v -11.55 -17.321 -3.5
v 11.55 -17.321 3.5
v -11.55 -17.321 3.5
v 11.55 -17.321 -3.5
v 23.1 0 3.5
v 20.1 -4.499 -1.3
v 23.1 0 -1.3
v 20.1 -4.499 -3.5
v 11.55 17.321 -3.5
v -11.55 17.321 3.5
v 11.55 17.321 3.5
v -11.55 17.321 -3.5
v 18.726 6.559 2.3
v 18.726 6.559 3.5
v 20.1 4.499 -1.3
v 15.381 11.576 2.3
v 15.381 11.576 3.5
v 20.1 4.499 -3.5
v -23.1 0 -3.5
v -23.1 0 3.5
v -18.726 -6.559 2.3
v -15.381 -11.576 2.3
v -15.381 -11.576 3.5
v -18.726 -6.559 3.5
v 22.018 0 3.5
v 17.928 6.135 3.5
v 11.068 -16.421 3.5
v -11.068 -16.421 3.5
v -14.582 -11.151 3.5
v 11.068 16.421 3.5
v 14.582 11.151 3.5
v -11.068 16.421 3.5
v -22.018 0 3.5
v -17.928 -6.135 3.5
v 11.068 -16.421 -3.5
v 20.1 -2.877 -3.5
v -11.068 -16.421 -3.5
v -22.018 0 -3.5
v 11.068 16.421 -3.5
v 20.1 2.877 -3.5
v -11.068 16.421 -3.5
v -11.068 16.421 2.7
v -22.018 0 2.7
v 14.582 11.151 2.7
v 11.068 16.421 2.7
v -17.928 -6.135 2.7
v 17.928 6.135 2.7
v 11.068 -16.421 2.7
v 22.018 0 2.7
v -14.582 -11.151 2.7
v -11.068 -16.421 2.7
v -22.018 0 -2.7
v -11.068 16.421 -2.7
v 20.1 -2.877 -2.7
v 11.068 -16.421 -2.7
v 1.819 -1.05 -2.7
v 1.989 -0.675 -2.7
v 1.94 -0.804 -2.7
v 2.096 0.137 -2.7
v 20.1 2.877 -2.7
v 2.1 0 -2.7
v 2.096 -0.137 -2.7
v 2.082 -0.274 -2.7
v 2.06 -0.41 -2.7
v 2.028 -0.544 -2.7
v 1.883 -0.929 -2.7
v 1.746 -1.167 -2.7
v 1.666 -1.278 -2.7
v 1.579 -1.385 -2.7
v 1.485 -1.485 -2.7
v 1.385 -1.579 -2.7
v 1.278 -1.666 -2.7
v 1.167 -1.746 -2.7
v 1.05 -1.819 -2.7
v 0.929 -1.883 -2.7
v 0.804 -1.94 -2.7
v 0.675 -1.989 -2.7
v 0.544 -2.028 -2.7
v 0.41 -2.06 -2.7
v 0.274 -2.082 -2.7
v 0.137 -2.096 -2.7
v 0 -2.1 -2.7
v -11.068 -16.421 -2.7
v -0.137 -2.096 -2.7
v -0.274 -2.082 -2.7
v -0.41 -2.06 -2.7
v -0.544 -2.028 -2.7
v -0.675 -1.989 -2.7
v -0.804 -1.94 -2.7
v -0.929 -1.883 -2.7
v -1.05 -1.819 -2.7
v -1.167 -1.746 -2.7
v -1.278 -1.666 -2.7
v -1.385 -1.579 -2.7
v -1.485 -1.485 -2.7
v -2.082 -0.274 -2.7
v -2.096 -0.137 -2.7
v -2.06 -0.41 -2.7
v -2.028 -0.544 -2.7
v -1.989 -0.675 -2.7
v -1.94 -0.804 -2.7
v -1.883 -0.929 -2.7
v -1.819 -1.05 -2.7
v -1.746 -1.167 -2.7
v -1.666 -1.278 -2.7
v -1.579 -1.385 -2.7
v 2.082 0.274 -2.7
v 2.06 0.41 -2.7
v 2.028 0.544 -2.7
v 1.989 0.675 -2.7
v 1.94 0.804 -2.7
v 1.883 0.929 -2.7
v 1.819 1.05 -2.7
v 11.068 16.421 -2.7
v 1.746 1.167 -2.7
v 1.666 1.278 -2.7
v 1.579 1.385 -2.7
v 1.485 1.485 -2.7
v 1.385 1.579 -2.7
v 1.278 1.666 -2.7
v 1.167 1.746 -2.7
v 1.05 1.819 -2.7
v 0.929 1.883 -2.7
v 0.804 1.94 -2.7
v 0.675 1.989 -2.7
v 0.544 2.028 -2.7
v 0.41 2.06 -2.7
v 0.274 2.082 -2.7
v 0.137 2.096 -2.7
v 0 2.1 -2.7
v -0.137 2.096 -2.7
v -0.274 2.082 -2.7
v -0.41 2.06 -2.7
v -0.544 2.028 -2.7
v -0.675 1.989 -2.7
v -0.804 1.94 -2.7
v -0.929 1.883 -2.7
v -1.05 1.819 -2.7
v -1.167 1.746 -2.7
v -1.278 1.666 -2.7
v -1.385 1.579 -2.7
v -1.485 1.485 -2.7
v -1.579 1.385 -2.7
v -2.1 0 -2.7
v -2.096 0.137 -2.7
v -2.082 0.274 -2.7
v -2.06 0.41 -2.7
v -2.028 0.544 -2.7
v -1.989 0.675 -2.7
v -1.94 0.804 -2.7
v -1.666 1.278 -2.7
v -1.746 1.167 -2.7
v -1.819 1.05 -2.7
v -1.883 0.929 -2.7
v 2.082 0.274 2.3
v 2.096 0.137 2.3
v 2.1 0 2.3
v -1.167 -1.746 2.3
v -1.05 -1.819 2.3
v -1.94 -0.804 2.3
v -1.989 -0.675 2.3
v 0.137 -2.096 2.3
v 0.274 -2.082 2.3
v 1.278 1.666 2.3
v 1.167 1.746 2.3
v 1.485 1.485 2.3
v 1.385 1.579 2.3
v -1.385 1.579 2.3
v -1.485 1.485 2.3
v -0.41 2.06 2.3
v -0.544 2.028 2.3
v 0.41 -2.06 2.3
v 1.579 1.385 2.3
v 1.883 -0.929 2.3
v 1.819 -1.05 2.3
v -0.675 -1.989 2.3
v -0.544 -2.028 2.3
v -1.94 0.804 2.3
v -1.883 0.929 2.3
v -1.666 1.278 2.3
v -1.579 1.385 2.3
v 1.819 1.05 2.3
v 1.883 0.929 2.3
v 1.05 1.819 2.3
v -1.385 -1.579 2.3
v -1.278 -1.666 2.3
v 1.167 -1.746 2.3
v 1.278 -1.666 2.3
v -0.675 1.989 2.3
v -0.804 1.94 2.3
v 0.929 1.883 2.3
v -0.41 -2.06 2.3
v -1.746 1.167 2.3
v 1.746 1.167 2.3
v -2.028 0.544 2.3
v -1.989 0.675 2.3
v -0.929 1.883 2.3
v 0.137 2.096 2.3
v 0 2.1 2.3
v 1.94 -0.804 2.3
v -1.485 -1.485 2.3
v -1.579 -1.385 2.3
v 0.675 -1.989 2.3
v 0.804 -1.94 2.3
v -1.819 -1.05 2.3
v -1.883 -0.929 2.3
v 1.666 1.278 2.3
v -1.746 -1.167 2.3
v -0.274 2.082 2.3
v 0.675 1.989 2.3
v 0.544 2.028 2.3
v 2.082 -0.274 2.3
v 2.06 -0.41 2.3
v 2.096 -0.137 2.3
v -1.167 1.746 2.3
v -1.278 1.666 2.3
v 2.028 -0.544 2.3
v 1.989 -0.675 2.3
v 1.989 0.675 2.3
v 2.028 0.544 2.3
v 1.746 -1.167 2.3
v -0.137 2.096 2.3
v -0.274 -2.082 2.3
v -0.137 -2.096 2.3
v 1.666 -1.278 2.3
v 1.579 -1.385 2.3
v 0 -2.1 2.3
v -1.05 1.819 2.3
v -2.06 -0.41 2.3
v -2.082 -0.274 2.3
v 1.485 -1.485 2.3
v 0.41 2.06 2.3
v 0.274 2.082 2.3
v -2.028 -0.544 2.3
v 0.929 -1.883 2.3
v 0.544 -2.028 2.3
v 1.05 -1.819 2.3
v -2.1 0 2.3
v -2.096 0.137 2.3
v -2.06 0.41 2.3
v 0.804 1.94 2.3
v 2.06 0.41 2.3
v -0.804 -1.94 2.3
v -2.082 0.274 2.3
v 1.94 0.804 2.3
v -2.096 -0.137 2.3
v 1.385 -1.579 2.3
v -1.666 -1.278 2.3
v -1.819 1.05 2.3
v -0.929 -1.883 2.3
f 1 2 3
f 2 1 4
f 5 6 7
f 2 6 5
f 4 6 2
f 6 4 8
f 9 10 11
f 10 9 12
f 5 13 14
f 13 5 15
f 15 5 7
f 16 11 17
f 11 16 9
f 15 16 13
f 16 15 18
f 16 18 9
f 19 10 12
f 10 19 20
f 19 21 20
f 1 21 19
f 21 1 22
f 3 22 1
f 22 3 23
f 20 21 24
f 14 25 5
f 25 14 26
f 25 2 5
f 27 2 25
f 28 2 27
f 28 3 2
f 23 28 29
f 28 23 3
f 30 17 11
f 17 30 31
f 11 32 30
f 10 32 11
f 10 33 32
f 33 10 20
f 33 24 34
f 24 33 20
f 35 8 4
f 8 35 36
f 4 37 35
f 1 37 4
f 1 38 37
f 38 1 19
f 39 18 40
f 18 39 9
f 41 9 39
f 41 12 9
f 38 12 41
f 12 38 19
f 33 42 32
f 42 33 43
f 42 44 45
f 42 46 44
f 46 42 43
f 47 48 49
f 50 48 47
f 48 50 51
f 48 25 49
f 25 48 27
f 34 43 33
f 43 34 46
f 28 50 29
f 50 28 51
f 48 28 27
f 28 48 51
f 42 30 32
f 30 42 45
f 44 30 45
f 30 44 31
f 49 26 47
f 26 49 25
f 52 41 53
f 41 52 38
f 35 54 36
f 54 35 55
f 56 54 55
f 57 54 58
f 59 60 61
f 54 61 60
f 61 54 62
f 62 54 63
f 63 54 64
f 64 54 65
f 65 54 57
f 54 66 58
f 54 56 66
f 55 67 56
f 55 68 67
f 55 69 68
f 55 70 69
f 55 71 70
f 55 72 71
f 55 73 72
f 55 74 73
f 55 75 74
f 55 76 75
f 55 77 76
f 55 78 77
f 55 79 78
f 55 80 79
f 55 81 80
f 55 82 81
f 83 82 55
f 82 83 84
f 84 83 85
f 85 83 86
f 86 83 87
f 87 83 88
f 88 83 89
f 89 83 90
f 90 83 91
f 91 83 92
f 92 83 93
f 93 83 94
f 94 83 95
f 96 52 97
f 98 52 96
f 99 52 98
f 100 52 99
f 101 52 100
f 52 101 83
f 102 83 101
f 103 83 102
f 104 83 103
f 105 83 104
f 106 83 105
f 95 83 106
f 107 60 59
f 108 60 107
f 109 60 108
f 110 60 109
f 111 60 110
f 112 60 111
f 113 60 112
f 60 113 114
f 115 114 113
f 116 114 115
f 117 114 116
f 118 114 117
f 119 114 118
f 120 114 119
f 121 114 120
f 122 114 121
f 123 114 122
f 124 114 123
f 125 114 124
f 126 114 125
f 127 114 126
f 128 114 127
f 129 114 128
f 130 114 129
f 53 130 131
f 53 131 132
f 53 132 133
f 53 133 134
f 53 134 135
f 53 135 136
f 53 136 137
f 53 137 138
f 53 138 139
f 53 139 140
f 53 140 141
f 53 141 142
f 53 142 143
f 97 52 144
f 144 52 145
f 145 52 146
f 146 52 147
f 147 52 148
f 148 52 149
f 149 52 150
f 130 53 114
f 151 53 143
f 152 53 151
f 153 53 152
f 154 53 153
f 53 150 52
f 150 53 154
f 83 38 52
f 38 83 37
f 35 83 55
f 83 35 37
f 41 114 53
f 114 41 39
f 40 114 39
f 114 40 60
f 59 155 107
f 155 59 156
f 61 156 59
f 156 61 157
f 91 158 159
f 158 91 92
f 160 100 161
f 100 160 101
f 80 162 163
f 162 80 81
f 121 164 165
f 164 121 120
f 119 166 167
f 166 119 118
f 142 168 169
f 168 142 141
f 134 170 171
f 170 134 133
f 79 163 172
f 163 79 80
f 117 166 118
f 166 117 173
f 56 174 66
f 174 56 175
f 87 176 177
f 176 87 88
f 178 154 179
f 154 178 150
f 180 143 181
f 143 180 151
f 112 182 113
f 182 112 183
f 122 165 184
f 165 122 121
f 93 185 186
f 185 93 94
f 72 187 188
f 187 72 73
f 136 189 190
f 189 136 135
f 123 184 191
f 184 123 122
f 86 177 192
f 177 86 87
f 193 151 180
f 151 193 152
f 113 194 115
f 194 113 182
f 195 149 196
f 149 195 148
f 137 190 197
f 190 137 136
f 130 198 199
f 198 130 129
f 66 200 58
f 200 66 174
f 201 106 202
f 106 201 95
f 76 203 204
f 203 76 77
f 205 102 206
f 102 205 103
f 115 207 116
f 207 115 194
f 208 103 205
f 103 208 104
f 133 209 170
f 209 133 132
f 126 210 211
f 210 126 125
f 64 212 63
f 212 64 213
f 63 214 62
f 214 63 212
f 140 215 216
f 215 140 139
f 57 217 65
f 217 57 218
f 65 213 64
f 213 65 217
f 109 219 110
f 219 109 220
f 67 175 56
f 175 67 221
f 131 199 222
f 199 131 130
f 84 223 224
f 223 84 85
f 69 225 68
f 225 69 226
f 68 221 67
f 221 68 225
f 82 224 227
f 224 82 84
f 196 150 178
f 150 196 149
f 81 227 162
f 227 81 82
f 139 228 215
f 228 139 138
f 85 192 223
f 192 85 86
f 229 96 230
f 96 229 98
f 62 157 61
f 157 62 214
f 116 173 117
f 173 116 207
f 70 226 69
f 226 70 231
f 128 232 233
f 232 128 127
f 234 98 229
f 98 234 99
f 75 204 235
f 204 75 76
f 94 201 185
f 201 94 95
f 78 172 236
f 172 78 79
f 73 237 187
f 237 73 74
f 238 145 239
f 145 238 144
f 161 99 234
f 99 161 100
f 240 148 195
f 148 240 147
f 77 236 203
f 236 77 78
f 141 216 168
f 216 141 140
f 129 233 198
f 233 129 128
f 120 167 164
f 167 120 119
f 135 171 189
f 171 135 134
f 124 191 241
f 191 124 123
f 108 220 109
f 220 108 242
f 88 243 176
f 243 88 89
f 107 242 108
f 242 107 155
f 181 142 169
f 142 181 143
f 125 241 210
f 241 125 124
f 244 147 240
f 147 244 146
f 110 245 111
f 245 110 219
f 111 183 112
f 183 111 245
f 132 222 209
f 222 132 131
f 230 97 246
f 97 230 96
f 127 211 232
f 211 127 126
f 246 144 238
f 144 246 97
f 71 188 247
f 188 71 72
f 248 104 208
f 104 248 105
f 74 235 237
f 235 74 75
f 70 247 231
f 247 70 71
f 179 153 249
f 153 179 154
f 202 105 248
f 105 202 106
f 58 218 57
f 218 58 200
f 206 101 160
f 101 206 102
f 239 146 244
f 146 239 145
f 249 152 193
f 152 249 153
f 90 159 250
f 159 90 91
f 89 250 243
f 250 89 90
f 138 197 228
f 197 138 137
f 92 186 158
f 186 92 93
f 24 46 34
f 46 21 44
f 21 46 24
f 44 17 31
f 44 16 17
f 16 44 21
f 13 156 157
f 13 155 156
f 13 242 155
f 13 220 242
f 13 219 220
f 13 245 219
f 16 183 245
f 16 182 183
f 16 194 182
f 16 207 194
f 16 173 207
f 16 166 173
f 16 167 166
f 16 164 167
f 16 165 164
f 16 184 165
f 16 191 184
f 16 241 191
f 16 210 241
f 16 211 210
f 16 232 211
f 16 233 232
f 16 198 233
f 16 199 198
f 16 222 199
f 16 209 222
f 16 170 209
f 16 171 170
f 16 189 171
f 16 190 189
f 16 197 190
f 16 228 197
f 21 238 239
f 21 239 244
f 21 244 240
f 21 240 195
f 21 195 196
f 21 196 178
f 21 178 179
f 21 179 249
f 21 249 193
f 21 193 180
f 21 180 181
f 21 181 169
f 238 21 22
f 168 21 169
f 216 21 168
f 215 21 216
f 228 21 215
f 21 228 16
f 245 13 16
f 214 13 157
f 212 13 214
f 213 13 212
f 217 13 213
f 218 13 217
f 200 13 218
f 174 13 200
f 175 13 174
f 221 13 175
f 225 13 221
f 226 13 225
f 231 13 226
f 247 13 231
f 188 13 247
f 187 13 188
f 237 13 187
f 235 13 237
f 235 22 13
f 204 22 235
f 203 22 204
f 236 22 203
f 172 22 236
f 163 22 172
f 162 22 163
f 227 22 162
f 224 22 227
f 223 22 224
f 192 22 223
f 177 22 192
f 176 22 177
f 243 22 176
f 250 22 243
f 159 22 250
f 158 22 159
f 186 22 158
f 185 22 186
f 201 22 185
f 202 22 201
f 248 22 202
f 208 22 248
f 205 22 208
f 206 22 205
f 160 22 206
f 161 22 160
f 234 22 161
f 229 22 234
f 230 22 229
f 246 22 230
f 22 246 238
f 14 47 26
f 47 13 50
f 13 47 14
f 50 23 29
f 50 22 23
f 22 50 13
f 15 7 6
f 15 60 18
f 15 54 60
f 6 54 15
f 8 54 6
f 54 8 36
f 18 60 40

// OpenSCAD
$fn=96;

L = 46.2;
W = 40.0;
T = 7.0;

chamfer_h = 0.8;
chamfer_inset = 0.9;

hole_d = 4.2;

groove_w = 6.0;
groove_depth = 1.2;
groove_angle = 28;

notch_w = 10.0;
notch_depth = 3.0;
notch_h = 2.2;

module hex_prism_flat(L, W, T){
    r = W/2;
    scale([L/W, 1, 1])
        cylinder(h=T, r=r, center=true, $fn=6);
}

module chamfered_hex(L, W, T, ch_h, inset){
    difference(){
        hex_prism_flat(L, W, T);
        translate([0,0, T/2 - ch_h/2])
            linear_extrude(height=ch_h, center=true, convexity=10)
                offset(delta=-inset)
                    scale([L/W, 1])
                        circle(r=W/2, $fn=6);
        translate([0,0,-T/2 + ch_h/2])
            linear_extrude(height=ch_h, center=true, convexity=10)
                offset(delta=-inset)
                    scale([L/W, 1])
                        circle(r=W/2, $fn=6);
    }
}

module diagonal_groove(L, W, depth, width, angle_deg){
    translate([0,0, T/2 - depth/2])
        rotate([0,0,angle_deg])
            cube([L*1.6, width, depth], center=true);
}

module end_notch(L, W, T, notch_w, notch_depth, notch_h){
    translate([L/2 - notch_depth/2, 0, -T/2 + notch_h/2])
        cube([notch_depth, notch_w, notch_h], center=true);
}

difference(){
    chamfered_hex(L, W, T, chamfer_h, chamfer_inset);

    cylinder(h=T+2, d=hole_d, center=true);

    diagonal_groove(L, W, groove_depth, groove_w, groove_angle);

    end_notch(L, W, T, notch_w, notch_depth, notch_h);
}
